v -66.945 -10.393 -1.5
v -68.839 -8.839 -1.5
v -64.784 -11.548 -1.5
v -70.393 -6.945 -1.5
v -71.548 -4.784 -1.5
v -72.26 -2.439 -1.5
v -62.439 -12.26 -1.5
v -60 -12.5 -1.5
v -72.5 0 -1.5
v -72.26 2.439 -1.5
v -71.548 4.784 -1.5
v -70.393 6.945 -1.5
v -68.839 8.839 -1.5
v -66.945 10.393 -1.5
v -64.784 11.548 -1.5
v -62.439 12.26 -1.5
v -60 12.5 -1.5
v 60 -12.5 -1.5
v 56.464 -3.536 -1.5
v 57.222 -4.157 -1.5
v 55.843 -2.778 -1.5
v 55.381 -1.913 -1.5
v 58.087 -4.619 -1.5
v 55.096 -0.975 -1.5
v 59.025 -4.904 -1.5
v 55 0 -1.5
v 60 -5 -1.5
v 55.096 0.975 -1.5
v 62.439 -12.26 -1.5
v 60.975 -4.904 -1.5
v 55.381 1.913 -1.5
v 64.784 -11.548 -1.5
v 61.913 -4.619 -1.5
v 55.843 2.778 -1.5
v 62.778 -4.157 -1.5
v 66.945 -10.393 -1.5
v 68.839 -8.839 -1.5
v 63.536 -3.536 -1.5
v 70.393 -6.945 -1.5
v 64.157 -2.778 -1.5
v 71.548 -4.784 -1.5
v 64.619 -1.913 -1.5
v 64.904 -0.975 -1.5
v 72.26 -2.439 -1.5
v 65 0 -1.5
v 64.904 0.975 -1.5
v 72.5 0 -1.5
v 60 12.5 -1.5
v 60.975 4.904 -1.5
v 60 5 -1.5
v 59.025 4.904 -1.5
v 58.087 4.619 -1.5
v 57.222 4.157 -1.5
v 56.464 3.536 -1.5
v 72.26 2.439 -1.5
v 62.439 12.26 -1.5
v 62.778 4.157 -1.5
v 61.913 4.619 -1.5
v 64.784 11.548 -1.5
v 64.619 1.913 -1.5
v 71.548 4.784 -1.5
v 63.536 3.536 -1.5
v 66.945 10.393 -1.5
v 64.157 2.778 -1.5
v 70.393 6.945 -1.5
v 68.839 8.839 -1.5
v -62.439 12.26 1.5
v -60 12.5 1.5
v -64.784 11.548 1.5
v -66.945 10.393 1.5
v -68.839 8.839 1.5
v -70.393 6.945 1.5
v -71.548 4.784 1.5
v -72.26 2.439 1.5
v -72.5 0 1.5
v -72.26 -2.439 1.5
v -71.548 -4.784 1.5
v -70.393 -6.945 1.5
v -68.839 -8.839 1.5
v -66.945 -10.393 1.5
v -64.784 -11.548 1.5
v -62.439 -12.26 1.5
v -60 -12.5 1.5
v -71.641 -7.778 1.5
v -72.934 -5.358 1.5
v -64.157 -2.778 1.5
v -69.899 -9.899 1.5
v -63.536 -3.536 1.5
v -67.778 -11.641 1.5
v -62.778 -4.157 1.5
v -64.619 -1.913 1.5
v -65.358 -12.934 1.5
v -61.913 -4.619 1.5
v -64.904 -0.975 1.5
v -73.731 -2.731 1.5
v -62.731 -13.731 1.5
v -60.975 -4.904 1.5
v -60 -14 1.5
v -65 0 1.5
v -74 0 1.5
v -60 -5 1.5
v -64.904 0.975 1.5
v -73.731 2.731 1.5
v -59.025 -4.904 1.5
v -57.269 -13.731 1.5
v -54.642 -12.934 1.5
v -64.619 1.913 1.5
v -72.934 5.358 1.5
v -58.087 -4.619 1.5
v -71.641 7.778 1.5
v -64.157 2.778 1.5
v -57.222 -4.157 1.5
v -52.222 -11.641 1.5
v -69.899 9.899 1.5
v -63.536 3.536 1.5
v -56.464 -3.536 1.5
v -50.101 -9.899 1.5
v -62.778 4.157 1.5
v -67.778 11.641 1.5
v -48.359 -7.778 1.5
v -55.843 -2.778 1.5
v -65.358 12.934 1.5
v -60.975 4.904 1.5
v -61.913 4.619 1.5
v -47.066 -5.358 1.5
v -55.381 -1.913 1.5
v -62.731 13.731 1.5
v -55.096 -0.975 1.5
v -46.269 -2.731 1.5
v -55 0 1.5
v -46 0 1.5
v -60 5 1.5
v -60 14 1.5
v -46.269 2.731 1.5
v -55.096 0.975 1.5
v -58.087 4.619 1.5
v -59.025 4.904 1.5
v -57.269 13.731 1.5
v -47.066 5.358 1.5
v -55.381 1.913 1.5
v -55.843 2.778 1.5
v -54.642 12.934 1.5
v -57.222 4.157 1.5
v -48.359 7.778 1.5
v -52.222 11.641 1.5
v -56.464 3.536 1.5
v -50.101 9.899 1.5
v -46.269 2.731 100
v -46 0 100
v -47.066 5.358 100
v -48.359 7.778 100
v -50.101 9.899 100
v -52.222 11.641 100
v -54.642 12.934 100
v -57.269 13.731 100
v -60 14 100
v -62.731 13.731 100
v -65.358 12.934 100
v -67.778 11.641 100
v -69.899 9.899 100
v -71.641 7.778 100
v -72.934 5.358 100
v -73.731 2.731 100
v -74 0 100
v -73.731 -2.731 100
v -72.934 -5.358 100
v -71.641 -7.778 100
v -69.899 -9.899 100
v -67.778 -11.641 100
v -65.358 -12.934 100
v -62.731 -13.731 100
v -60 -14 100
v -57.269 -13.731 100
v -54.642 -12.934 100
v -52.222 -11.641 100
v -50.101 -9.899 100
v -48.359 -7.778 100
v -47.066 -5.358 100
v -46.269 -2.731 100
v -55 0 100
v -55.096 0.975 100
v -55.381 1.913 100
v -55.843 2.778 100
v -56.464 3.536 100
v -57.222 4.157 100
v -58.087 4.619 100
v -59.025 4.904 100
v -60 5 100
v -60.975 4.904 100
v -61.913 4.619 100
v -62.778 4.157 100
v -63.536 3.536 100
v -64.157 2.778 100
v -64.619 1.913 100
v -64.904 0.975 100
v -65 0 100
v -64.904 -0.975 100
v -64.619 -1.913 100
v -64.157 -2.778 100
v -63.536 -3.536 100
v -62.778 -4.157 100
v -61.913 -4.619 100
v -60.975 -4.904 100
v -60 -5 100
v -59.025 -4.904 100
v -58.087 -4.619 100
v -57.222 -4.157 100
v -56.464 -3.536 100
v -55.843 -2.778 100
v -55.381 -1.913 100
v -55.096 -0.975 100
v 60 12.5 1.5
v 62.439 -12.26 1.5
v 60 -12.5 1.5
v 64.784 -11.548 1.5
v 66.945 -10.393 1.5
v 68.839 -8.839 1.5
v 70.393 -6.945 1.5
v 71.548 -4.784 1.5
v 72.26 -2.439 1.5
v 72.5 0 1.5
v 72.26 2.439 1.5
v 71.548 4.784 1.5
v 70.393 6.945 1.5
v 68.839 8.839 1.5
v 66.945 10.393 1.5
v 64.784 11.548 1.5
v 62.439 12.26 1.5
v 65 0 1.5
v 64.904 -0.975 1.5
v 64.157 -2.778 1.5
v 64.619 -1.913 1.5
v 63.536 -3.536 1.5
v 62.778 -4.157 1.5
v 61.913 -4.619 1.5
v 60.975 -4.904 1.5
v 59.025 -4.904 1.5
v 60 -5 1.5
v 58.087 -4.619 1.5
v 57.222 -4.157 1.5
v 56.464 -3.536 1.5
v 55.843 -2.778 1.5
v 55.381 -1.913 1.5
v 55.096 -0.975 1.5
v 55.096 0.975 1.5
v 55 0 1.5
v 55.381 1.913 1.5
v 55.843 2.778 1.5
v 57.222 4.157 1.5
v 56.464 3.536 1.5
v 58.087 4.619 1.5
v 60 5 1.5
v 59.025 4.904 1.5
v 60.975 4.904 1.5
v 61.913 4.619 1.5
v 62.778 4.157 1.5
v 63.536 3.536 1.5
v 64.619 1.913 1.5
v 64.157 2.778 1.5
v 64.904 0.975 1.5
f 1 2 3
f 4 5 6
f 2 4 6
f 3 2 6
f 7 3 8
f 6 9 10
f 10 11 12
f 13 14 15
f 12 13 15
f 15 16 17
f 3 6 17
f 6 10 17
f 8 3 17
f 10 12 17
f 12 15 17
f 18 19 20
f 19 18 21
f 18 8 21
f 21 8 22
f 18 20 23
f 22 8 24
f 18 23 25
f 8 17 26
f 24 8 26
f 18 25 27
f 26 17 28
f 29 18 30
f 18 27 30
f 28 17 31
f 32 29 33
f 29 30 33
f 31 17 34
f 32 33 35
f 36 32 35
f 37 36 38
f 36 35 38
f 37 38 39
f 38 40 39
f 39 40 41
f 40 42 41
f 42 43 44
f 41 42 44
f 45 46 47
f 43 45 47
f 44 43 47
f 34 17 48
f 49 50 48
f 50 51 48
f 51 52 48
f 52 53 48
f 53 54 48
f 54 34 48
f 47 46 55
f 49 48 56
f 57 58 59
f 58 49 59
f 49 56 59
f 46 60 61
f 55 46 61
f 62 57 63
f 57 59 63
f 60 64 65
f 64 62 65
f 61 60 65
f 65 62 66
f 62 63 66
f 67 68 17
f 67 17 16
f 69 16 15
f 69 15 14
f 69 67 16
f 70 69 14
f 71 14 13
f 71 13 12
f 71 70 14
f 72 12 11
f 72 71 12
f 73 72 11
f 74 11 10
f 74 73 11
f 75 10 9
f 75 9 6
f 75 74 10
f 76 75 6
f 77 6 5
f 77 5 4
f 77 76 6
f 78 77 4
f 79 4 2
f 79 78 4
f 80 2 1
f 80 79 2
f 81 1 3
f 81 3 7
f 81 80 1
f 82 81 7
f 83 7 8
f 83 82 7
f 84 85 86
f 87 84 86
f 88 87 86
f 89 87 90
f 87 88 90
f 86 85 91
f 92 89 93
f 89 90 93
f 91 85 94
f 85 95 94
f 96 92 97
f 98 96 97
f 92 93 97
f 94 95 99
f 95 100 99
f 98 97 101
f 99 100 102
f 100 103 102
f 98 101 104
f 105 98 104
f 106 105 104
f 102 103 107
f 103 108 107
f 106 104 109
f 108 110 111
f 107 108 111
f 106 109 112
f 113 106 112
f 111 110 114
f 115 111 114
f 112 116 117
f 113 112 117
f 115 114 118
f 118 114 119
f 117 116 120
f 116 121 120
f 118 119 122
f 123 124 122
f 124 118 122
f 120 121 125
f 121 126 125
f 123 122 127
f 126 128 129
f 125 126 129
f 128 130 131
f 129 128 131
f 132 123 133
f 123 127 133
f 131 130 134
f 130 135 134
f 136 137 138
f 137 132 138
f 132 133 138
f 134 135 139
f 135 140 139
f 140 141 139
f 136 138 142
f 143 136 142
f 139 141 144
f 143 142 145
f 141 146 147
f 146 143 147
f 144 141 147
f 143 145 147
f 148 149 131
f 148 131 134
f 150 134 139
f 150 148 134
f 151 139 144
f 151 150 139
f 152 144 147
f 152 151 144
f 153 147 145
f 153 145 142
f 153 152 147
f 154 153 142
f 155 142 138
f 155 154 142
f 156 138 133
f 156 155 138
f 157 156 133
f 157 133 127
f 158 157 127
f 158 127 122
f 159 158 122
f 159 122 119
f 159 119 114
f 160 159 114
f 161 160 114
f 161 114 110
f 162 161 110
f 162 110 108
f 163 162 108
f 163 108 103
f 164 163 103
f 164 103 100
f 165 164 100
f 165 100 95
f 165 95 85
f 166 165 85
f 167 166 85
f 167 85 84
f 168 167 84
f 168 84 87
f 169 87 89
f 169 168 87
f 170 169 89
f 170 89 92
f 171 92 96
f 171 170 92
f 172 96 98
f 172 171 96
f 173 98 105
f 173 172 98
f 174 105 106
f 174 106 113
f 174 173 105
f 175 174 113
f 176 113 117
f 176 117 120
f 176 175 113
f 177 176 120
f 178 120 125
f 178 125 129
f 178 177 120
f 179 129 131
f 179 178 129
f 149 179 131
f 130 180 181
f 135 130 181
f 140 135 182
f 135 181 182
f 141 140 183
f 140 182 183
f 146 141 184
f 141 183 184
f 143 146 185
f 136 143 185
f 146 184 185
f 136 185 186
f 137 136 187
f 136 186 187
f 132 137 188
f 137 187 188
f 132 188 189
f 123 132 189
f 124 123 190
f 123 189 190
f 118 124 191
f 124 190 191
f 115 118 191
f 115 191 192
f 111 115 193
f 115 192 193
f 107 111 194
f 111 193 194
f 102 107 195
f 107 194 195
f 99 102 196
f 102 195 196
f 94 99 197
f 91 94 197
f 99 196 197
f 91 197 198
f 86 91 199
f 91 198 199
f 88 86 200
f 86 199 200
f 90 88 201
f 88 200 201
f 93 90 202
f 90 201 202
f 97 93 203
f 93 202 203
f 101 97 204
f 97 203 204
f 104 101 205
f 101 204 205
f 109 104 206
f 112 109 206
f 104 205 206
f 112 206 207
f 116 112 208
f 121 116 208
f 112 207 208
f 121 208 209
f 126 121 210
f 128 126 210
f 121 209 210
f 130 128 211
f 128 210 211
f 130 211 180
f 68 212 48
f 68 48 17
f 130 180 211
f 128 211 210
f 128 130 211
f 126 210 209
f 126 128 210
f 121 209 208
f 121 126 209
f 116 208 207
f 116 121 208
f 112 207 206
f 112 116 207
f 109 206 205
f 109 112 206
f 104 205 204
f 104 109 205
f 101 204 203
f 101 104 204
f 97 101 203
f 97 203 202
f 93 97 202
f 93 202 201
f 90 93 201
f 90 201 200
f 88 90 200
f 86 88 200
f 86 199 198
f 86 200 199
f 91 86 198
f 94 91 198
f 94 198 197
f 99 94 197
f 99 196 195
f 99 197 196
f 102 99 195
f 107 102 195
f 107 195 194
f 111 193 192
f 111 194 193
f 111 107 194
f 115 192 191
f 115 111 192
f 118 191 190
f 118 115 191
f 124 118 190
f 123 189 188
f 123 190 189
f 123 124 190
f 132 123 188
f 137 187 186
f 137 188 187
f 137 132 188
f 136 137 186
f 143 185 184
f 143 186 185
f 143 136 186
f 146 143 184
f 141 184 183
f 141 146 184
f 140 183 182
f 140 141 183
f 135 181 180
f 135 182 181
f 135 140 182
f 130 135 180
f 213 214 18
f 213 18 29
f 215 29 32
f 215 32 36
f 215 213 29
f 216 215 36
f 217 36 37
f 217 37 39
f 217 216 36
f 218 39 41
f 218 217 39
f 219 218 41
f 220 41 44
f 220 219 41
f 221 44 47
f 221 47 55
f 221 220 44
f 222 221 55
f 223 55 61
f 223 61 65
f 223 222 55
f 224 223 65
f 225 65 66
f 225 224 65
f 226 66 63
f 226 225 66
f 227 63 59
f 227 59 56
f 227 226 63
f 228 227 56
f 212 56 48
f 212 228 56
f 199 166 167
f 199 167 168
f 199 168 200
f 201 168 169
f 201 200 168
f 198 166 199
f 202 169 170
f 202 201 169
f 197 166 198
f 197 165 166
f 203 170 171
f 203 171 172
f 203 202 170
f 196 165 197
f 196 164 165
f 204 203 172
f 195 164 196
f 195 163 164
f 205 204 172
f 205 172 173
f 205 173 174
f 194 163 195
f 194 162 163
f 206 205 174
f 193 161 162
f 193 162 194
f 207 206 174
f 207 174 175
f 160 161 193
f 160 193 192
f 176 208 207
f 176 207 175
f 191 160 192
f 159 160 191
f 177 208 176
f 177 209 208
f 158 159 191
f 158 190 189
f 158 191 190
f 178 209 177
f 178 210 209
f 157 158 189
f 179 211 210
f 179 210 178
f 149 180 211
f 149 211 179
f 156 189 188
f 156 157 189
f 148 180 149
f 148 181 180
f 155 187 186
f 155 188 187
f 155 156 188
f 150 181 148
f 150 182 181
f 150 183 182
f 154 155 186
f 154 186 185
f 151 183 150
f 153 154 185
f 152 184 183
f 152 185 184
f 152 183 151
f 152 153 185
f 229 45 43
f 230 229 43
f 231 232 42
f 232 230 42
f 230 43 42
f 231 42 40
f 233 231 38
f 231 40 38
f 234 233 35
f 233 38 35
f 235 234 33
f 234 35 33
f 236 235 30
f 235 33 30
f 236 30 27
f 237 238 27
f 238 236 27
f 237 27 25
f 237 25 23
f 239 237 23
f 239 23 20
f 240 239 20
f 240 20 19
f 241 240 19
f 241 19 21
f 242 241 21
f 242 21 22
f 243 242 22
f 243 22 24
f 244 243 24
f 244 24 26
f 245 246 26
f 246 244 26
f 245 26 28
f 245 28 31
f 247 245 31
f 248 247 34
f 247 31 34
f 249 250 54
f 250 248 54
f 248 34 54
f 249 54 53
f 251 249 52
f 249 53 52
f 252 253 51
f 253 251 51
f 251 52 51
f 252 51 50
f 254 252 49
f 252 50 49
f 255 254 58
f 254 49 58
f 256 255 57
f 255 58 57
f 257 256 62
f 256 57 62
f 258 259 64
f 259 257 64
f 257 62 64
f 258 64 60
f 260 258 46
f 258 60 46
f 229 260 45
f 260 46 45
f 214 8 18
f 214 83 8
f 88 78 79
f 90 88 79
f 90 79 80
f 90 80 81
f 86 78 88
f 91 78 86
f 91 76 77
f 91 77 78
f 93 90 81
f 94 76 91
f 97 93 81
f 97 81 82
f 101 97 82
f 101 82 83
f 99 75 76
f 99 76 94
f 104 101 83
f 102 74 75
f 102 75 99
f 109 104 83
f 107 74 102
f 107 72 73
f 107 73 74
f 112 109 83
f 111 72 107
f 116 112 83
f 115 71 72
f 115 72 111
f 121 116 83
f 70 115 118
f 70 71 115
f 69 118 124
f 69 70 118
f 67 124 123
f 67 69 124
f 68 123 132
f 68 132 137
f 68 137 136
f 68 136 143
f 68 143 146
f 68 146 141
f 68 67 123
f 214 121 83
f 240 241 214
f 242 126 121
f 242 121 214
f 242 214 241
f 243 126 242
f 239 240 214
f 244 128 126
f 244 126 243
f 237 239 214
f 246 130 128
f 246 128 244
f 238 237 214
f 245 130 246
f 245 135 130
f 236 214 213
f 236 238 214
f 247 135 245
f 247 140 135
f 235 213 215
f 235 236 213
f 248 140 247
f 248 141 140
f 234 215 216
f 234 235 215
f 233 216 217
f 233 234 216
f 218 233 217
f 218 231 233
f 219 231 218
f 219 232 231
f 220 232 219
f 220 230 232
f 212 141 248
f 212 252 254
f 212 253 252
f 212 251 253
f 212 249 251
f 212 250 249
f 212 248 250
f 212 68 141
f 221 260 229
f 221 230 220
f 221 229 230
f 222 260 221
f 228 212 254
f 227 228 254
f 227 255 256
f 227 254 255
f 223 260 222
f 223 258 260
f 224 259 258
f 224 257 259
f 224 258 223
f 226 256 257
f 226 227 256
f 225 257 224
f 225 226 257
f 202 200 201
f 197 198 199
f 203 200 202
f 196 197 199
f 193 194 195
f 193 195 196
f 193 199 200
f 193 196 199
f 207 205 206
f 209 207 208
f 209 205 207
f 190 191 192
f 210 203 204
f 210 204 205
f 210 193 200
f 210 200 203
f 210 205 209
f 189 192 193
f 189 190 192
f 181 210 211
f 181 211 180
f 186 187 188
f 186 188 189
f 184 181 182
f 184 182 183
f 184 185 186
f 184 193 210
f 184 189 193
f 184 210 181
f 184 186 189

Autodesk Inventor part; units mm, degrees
ref_plane "YZ Plane" through (0, 0, 0) normal (1, 0, 0) x (0, 1, 0)
ref_plane "XZ Plane" through (0, 0, 0) normal (0, 1, 0) x (-1, 0, 0)
ref_plane "XY Plane" through (0, 0, 0) normal (0, 0, 1) x (1, 0, 0)
sketch "Esboço1" plane through (0, 0, 0) normal (0, 0, 1) x (1, 0, 0)
  line L0 (-60, 0) -> (60, 0) construction
  line L1 (-60, -12.5) -> (60, -12.5)
  line L2 (60, 12.5) -> (-60, 12.5)
  arc A0 (-60, 12.5) -> (-60, -12.5) centre (-60, 0) ccw
  arc A1 (60, -12.5) -> (60, 12.5) centre (60, 0) ccw
  circle A2 centre (60, 0) radius 5
  circle A3 centre (-60, 0) radius 5
  point P0 (0, 0)
  dimension "d0" = 25
  dimension "d1" = 10
  dimension "d2" = 10
  dimension "d9" = 120
extrude "Extrusão1" add sketch "Esboço1" along normal mid plane 3 contours A0 L2 A1 L1 | A3
extrude "Extrusão2" add sketch "Esboço1" along normal blind 100 contours A3
sketch "Esboço2" plane through (-60, 0, 100) normal (0, 0, 1) x (1, 0, 0)
  circle A0 centre (0, 0) radius 14
  circle A1 centre (0, 0) radius 5 projected
  point P0 (60, 0)
  dimension "d7" = 100
  dimension "d10" = 28
  dimension "d11" = 10
extrude "Extrusão3" add sketch "Esboço2" against normal up to surface (98.5 mm away) separate body
properties part number "Batente limitador"
